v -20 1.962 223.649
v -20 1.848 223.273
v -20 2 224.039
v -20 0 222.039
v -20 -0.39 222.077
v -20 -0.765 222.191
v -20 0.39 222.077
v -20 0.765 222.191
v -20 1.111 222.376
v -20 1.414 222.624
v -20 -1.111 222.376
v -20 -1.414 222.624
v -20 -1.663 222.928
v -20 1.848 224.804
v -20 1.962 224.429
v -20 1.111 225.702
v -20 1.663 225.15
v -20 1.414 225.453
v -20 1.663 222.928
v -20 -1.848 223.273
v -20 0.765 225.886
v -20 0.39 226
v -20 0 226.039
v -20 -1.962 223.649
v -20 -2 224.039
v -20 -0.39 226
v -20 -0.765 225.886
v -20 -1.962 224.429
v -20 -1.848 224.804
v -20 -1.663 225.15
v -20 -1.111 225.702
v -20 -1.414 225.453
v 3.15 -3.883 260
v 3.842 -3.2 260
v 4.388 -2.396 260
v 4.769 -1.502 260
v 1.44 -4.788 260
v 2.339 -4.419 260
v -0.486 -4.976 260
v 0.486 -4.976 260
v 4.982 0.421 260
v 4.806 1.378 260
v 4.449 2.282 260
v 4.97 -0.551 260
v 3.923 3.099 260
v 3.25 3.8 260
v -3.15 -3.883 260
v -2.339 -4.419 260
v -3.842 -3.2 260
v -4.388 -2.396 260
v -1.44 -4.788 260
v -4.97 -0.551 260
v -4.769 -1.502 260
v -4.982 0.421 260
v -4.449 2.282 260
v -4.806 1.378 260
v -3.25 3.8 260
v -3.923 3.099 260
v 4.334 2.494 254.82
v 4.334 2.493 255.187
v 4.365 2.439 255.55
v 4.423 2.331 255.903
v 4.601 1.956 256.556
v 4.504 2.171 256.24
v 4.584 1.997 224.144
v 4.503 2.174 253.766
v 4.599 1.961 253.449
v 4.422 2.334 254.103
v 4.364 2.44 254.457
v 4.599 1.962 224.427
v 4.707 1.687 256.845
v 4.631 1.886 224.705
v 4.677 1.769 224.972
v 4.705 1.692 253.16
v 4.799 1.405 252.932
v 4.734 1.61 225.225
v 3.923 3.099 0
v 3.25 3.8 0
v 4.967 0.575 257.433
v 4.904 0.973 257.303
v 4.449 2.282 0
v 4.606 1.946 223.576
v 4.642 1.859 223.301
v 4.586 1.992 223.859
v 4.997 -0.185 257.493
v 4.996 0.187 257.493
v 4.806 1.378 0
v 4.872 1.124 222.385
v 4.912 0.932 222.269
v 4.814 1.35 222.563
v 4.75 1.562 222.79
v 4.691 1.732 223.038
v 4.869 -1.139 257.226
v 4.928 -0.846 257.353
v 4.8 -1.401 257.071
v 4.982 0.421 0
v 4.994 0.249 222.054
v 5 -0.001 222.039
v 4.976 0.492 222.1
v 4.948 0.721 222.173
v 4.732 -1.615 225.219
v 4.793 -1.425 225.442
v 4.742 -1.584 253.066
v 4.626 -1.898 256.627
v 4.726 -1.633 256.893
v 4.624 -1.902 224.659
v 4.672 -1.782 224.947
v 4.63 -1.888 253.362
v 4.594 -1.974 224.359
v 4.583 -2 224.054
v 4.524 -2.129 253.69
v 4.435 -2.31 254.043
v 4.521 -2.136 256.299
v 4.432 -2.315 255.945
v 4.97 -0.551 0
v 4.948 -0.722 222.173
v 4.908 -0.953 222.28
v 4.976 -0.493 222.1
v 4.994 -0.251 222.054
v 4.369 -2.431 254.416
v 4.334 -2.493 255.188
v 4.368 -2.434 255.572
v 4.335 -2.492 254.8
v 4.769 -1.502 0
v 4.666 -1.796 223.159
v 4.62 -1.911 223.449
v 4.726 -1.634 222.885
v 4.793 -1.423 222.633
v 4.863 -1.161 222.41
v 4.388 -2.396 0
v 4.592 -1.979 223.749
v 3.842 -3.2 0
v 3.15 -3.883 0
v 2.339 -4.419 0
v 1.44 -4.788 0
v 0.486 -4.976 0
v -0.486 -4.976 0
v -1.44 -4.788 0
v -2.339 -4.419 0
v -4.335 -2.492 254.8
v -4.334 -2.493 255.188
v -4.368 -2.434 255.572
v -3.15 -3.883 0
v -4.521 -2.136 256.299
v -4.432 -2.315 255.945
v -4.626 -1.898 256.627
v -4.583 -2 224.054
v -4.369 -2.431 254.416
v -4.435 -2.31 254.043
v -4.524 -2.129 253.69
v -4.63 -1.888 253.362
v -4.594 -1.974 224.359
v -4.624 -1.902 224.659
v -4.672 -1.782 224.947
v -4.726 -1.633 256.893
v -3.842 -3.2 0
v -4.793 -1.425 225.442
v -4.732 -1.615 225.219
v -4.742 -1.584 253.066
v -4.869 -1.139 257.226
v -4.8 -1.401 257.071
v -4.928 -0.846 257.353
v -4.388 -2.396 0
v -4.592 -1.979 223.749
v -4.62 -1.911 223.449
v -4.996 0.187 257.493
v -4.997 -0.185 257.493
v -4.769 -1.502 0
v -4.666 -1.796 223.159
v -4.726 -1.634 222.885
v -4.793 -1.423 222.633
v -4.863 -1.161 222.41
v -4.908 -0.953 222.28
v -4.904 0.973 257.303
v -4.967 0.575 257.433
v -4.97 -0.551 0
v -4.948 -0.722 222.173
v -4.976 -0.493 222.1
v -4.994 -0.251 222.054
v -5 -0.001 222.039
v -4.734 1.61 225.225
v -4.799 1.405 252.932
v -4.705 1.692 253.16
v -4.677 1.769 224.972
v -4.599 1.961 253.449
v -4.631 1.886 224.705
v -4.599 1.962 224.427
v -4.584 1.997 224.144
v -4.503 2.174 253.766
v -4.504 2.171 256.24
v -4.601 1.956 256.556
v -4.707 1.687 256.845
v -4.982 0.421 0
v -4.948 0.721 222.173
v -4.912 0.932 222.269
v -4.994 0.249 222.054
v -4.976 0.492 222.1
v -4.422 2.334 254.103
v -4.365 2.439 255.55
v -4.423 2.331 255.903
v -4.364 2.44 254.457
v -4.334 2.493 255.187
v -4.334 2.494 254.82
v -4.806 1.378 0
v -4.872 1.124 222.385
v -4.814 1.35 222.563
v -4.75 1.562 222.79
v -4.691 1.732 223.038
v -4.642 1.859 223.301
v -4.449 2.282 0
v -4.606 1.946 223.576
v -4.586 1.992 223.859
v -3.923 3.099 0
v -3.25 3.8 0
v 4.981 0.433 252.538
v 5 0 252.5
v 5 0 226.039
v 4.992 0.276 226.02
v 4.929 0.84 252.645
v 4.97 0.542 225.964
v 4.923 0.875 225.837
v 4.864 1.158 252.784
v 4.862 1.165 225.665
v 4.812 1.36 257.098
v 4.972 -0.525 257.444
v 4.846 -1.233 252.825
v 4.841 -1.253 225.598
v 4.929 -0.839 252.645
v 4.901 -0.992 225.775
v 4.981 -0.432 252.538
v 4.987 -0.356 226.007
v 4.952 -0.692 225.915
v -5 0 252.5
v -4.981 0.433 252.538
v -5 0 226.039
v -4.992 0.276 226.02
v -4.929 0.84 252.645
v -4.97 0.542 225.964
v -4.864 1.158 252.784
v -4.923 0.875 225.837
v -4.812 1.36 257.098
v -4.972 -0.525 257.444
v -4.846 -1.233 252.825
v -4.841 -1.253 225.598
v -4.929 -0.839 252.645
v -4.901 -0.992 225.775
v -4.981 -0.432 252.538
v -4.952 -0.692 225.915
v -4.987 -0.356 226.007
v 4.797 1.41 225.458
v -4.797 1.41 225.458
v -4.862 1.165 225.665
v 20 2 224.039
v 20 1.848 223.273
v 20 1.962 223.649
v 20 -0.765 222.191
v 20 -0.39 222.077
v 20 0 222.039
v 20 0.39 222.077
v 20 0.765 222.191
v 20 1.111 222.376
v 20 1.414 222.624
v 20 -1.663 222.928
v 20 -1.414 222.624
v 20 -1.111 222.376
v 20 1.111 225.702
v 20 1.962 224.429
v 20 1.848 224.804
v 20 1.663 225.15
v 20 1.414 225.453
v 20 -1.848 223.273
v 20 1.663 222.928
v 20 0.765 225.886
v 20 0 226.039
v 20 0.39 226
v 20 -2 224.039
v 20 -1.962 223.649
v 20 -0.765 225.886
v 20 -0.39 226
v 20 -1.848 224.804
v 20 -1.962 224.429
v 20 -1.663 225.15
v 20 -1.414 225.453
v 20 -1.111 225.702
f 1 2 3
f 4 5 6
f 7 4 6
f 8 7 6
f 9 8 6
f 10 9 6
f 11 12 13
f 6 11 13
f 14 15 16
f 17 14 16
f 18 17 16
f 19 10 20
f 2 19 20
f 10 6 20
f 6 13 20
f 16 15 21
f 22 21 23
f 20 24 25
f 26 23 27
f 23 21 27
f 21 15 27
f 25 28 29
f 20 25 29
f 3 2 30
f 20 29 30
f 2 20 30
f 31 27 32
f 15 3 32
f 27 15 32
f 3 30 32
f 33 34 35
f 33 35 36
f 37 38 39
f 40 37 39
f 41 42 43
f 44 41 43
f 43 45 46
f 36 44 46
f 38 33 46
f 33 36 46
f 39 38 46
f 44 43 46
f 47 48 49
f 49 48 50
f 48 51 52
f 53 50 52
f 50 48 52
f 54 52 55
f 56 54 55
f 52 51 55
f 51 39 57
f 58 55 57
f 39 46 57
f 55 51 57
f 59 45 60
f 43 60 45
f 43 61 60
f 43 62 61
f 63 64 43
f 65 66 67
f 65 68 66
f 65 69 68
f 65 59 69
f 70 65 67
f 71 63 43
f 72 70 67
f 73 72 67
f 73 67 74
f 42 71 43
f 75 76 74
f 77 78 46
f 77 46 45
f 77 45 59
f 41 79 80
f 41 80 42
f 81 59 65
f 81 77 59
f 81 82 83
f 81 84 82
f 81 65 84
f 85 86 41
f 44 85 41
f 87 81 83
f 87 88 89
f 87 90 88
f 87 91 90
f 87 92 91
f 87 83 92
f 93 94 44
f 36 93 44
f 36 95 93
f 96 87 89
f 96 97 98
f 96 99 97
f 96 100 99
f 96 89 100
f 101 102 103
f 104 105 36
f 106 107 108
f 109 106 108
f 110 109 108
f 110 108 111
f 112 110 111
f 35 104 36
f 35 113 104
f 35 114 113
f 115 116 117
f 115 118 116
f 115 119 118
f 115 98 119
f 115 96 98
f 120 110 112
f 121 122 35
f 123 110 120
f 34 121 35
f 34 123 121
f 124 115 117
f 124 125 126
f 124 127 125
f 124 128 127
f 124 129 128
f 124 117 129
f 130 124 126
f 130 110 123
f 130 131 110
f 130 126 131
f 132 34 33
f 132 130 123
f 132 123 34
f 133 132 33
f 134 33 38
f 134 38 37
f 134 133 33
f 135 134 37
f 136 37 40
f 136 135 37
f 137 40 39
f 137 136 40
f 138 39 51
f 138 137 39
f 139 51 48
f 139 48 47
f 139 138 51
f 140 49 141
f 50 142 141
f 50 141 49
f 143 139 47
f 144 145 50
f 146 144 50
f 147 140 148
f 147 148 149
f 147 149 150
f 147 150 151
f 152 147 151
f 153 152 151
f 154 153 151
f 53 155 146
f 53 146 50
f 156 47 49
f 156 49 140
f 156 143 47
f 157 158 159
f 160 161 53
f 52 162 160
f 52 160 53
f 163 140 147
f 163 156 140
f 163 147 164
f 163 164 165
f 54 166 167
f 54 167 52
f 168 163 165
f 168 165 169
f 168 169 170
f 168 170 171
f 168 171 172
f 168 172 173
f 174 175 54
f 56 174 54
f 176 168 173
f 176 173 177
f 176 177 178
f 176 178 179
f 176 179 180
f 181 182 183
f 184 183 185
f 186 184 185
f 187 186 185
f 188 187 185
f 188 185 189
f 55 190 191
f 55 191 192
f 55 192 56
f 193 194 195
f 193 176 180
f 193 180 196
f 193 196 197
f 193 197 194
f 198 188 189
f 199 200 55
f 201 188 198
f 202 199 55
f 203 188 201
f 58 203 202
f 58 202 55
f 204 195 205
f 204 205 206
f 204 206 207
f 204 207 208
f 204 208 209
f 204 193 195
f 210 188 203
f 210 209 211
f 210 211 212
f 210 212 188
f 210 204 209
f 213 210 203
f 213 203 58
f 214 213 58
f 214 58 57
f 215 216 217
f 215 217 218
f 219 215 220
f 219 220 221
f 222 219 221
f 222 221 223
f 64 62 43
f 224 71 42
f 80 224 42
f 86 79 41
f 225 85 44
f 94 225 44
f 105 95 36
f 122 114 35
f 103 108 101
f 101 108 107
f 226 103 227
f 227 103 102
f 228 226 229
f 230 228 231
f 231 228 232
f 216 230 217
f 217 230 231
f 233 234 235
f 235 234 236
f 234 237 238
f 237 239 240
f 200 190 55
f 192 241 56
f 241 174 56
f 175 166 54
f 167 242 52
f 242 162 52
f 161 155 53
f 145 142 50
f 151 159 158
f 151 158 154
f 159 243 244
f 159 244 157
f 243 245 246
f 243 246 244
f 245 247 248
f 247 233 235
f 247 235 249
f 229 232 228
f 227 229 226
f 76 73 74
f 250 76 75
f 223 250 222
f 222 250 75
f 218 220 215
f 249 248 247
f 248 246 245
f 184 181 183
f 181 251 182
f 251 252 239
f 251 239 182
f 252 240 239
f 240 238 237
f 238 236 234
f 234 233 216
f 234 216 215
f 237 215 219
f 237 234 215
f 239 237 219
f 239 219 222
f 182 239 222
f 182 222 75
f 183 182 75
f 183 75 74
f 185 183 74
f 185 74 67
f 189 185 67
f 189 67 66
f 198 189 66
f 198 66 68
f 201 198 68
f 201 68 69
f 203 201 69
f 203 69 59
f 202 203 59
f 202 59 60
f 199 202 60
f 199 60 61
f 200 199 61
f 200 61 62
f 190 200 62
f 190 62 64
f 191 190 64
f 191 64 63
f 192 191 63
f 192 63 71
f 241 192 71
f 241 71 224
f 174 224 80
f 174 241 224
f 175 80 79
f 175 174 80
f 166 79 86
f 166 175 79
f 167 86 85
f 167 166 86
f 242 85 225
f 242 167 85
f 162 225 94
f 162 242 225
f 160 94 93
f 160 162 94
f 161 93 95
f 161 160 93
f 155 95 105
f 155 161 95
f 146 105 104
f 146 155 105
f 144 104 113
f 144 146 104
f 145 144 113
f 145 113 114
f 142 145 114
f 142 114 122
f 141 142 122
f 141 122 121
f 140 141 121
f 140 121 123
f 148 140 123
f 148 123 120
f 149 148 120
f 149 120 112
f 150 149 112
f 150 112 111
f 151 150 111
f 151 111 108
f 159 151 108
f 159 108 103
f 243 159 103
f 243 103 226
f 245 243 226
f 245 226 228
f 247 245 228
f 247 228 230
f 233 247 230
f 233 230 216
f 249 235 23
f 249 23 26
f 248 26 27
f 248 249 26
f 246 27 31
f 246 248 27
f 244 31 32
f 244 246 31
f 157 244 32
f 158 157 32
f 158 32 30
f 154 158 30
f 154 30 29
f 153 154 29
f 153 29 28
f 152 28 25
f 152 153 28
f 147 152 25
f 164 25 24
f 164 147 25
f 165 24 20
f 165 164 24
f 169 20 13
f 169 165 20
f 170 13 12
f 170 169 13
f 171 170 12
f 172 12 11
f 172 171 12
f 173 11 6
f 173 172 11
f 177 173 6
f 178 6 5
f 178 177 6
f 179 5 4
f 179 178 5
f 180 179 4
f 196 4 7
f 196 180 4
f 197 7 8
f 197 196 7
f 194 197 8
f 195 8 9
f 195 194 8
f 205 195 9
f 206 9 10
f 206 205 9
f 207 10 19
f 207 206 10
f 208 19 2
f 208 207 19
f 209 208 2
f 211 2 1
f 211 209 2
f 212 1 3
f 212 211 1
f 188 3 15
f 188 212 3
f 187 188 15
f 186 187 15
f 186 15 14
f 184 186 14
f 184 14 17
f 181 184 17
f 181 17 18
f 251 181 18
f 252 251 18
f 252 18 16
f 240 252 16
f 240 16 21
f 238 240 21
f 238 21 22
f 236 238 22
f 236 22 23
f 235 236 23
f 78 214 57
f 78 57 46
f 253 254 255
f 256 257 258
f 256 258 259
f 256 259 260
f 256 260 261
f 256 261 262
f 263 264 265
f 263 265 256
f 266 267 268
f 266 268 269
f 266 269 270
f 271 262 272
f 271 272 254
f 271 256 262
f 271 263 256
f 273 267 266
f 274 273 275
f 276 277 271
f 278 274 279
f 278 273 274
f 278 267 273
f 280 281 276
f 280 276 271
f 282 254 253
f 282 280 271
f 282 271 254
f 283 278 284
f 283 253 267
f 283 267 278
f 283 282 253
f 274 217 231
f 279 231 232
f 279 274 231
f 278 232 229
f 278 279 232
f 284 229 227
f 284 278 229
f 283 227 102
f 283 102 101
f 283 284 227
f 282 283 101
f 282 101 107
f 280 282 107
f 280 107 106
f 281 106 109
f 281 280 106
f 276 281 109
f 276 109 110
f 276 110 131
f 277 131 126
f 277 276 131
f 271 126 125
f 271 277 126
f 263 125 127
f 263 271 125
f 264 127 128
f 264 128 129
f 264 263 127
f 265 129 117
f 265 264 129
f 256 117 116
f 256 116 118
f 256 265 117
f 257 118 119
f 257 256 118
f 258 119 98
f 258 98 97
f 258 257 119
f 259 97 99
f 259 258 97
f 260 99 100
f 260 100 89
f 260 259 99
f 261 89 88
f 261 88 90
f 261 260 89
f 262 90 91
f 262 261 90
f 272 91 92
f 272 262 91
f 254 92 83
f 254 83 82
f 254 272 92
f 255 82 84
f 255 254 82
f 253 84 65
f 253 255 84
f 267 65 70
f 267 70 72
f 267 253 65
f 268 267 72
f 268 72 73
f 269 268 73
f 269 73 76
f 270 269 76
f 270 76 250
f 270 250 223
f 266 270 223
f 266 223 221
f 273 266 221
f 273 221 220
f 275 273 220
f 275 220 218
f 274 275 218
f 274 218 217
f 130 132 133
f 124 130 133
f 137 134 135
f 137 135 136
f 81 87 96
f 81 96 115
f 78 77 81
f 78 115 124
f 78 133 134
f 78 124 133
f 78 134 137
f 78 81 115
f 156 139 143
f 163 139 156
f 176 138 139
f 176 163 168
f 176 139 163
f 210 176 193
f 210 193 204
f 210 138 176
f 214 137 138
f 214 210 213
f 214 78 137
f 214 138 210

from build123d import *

# Parameters (mm, degrees)
BOSS_EXTRU_1_DEPTH           = 260
ENL_V_MAT_EXTRU_1_DEPTH      = 261.096136073
ENL_V_MAT_EXTRU_1_DEPTH_BACK = 261.096136073
ESQUISSE2_R                  = 2.5
ESQUISSE3_R                  = 2
BOSS_EXTRU_2_DEPTH           = 20


with BuildPart() as part:
    # Esquisse1 → Boss.-Extru.1 (new body)
    with BuildSketch(Plane.XY):
        with BuildLine():
            Line((-3.249615362, 3.8), (3.249615362, 3.8))
            ThreePointArc((3.249615362, 3.8), (0, -5), (-3.249615362, 3.8))
        make_face()
    extrude(amount=BOSS_EXTRU_1_DEPTH)

    # Esquisse2 → Enlèv. mat.-Extru.1 (cut, two sides: drawn at the far end of the back side and taken through both)
    with BuildSketch(Plane(origin=(0, 0, 0), x_dir=(0, 0, -1), z_dir=(1, 0, 0)).offset(-ENL_V_MAT_EXTRU_1_DEPTH_BACK)):
        with Locations((-255, 0)):
            Circle(ESQUISSE2_R)
    extrude(amount=ENL_V_MAT_EXTRU_1_DEPTH + ENL_V_MAT_EXTRU_1_DEPTH_BACK, mode=Mode.SUBTRACT)

    # Esquisse3 → Boss.-Extru.2 (add, symmetric)
    with BuildSketch(Plane(origin=(0, 0, 0), x_dir=(0, 0, -1), z_dir=(1, 0, 0))):
        with Locations(Location((-224.038713001, 0, 0), (0, 0, 180))):
            Circle(ESQUISSE3_R)
    extrude(amount=BOSS_EXTRU_2_DEPTH, both=True)


solid = part.part
